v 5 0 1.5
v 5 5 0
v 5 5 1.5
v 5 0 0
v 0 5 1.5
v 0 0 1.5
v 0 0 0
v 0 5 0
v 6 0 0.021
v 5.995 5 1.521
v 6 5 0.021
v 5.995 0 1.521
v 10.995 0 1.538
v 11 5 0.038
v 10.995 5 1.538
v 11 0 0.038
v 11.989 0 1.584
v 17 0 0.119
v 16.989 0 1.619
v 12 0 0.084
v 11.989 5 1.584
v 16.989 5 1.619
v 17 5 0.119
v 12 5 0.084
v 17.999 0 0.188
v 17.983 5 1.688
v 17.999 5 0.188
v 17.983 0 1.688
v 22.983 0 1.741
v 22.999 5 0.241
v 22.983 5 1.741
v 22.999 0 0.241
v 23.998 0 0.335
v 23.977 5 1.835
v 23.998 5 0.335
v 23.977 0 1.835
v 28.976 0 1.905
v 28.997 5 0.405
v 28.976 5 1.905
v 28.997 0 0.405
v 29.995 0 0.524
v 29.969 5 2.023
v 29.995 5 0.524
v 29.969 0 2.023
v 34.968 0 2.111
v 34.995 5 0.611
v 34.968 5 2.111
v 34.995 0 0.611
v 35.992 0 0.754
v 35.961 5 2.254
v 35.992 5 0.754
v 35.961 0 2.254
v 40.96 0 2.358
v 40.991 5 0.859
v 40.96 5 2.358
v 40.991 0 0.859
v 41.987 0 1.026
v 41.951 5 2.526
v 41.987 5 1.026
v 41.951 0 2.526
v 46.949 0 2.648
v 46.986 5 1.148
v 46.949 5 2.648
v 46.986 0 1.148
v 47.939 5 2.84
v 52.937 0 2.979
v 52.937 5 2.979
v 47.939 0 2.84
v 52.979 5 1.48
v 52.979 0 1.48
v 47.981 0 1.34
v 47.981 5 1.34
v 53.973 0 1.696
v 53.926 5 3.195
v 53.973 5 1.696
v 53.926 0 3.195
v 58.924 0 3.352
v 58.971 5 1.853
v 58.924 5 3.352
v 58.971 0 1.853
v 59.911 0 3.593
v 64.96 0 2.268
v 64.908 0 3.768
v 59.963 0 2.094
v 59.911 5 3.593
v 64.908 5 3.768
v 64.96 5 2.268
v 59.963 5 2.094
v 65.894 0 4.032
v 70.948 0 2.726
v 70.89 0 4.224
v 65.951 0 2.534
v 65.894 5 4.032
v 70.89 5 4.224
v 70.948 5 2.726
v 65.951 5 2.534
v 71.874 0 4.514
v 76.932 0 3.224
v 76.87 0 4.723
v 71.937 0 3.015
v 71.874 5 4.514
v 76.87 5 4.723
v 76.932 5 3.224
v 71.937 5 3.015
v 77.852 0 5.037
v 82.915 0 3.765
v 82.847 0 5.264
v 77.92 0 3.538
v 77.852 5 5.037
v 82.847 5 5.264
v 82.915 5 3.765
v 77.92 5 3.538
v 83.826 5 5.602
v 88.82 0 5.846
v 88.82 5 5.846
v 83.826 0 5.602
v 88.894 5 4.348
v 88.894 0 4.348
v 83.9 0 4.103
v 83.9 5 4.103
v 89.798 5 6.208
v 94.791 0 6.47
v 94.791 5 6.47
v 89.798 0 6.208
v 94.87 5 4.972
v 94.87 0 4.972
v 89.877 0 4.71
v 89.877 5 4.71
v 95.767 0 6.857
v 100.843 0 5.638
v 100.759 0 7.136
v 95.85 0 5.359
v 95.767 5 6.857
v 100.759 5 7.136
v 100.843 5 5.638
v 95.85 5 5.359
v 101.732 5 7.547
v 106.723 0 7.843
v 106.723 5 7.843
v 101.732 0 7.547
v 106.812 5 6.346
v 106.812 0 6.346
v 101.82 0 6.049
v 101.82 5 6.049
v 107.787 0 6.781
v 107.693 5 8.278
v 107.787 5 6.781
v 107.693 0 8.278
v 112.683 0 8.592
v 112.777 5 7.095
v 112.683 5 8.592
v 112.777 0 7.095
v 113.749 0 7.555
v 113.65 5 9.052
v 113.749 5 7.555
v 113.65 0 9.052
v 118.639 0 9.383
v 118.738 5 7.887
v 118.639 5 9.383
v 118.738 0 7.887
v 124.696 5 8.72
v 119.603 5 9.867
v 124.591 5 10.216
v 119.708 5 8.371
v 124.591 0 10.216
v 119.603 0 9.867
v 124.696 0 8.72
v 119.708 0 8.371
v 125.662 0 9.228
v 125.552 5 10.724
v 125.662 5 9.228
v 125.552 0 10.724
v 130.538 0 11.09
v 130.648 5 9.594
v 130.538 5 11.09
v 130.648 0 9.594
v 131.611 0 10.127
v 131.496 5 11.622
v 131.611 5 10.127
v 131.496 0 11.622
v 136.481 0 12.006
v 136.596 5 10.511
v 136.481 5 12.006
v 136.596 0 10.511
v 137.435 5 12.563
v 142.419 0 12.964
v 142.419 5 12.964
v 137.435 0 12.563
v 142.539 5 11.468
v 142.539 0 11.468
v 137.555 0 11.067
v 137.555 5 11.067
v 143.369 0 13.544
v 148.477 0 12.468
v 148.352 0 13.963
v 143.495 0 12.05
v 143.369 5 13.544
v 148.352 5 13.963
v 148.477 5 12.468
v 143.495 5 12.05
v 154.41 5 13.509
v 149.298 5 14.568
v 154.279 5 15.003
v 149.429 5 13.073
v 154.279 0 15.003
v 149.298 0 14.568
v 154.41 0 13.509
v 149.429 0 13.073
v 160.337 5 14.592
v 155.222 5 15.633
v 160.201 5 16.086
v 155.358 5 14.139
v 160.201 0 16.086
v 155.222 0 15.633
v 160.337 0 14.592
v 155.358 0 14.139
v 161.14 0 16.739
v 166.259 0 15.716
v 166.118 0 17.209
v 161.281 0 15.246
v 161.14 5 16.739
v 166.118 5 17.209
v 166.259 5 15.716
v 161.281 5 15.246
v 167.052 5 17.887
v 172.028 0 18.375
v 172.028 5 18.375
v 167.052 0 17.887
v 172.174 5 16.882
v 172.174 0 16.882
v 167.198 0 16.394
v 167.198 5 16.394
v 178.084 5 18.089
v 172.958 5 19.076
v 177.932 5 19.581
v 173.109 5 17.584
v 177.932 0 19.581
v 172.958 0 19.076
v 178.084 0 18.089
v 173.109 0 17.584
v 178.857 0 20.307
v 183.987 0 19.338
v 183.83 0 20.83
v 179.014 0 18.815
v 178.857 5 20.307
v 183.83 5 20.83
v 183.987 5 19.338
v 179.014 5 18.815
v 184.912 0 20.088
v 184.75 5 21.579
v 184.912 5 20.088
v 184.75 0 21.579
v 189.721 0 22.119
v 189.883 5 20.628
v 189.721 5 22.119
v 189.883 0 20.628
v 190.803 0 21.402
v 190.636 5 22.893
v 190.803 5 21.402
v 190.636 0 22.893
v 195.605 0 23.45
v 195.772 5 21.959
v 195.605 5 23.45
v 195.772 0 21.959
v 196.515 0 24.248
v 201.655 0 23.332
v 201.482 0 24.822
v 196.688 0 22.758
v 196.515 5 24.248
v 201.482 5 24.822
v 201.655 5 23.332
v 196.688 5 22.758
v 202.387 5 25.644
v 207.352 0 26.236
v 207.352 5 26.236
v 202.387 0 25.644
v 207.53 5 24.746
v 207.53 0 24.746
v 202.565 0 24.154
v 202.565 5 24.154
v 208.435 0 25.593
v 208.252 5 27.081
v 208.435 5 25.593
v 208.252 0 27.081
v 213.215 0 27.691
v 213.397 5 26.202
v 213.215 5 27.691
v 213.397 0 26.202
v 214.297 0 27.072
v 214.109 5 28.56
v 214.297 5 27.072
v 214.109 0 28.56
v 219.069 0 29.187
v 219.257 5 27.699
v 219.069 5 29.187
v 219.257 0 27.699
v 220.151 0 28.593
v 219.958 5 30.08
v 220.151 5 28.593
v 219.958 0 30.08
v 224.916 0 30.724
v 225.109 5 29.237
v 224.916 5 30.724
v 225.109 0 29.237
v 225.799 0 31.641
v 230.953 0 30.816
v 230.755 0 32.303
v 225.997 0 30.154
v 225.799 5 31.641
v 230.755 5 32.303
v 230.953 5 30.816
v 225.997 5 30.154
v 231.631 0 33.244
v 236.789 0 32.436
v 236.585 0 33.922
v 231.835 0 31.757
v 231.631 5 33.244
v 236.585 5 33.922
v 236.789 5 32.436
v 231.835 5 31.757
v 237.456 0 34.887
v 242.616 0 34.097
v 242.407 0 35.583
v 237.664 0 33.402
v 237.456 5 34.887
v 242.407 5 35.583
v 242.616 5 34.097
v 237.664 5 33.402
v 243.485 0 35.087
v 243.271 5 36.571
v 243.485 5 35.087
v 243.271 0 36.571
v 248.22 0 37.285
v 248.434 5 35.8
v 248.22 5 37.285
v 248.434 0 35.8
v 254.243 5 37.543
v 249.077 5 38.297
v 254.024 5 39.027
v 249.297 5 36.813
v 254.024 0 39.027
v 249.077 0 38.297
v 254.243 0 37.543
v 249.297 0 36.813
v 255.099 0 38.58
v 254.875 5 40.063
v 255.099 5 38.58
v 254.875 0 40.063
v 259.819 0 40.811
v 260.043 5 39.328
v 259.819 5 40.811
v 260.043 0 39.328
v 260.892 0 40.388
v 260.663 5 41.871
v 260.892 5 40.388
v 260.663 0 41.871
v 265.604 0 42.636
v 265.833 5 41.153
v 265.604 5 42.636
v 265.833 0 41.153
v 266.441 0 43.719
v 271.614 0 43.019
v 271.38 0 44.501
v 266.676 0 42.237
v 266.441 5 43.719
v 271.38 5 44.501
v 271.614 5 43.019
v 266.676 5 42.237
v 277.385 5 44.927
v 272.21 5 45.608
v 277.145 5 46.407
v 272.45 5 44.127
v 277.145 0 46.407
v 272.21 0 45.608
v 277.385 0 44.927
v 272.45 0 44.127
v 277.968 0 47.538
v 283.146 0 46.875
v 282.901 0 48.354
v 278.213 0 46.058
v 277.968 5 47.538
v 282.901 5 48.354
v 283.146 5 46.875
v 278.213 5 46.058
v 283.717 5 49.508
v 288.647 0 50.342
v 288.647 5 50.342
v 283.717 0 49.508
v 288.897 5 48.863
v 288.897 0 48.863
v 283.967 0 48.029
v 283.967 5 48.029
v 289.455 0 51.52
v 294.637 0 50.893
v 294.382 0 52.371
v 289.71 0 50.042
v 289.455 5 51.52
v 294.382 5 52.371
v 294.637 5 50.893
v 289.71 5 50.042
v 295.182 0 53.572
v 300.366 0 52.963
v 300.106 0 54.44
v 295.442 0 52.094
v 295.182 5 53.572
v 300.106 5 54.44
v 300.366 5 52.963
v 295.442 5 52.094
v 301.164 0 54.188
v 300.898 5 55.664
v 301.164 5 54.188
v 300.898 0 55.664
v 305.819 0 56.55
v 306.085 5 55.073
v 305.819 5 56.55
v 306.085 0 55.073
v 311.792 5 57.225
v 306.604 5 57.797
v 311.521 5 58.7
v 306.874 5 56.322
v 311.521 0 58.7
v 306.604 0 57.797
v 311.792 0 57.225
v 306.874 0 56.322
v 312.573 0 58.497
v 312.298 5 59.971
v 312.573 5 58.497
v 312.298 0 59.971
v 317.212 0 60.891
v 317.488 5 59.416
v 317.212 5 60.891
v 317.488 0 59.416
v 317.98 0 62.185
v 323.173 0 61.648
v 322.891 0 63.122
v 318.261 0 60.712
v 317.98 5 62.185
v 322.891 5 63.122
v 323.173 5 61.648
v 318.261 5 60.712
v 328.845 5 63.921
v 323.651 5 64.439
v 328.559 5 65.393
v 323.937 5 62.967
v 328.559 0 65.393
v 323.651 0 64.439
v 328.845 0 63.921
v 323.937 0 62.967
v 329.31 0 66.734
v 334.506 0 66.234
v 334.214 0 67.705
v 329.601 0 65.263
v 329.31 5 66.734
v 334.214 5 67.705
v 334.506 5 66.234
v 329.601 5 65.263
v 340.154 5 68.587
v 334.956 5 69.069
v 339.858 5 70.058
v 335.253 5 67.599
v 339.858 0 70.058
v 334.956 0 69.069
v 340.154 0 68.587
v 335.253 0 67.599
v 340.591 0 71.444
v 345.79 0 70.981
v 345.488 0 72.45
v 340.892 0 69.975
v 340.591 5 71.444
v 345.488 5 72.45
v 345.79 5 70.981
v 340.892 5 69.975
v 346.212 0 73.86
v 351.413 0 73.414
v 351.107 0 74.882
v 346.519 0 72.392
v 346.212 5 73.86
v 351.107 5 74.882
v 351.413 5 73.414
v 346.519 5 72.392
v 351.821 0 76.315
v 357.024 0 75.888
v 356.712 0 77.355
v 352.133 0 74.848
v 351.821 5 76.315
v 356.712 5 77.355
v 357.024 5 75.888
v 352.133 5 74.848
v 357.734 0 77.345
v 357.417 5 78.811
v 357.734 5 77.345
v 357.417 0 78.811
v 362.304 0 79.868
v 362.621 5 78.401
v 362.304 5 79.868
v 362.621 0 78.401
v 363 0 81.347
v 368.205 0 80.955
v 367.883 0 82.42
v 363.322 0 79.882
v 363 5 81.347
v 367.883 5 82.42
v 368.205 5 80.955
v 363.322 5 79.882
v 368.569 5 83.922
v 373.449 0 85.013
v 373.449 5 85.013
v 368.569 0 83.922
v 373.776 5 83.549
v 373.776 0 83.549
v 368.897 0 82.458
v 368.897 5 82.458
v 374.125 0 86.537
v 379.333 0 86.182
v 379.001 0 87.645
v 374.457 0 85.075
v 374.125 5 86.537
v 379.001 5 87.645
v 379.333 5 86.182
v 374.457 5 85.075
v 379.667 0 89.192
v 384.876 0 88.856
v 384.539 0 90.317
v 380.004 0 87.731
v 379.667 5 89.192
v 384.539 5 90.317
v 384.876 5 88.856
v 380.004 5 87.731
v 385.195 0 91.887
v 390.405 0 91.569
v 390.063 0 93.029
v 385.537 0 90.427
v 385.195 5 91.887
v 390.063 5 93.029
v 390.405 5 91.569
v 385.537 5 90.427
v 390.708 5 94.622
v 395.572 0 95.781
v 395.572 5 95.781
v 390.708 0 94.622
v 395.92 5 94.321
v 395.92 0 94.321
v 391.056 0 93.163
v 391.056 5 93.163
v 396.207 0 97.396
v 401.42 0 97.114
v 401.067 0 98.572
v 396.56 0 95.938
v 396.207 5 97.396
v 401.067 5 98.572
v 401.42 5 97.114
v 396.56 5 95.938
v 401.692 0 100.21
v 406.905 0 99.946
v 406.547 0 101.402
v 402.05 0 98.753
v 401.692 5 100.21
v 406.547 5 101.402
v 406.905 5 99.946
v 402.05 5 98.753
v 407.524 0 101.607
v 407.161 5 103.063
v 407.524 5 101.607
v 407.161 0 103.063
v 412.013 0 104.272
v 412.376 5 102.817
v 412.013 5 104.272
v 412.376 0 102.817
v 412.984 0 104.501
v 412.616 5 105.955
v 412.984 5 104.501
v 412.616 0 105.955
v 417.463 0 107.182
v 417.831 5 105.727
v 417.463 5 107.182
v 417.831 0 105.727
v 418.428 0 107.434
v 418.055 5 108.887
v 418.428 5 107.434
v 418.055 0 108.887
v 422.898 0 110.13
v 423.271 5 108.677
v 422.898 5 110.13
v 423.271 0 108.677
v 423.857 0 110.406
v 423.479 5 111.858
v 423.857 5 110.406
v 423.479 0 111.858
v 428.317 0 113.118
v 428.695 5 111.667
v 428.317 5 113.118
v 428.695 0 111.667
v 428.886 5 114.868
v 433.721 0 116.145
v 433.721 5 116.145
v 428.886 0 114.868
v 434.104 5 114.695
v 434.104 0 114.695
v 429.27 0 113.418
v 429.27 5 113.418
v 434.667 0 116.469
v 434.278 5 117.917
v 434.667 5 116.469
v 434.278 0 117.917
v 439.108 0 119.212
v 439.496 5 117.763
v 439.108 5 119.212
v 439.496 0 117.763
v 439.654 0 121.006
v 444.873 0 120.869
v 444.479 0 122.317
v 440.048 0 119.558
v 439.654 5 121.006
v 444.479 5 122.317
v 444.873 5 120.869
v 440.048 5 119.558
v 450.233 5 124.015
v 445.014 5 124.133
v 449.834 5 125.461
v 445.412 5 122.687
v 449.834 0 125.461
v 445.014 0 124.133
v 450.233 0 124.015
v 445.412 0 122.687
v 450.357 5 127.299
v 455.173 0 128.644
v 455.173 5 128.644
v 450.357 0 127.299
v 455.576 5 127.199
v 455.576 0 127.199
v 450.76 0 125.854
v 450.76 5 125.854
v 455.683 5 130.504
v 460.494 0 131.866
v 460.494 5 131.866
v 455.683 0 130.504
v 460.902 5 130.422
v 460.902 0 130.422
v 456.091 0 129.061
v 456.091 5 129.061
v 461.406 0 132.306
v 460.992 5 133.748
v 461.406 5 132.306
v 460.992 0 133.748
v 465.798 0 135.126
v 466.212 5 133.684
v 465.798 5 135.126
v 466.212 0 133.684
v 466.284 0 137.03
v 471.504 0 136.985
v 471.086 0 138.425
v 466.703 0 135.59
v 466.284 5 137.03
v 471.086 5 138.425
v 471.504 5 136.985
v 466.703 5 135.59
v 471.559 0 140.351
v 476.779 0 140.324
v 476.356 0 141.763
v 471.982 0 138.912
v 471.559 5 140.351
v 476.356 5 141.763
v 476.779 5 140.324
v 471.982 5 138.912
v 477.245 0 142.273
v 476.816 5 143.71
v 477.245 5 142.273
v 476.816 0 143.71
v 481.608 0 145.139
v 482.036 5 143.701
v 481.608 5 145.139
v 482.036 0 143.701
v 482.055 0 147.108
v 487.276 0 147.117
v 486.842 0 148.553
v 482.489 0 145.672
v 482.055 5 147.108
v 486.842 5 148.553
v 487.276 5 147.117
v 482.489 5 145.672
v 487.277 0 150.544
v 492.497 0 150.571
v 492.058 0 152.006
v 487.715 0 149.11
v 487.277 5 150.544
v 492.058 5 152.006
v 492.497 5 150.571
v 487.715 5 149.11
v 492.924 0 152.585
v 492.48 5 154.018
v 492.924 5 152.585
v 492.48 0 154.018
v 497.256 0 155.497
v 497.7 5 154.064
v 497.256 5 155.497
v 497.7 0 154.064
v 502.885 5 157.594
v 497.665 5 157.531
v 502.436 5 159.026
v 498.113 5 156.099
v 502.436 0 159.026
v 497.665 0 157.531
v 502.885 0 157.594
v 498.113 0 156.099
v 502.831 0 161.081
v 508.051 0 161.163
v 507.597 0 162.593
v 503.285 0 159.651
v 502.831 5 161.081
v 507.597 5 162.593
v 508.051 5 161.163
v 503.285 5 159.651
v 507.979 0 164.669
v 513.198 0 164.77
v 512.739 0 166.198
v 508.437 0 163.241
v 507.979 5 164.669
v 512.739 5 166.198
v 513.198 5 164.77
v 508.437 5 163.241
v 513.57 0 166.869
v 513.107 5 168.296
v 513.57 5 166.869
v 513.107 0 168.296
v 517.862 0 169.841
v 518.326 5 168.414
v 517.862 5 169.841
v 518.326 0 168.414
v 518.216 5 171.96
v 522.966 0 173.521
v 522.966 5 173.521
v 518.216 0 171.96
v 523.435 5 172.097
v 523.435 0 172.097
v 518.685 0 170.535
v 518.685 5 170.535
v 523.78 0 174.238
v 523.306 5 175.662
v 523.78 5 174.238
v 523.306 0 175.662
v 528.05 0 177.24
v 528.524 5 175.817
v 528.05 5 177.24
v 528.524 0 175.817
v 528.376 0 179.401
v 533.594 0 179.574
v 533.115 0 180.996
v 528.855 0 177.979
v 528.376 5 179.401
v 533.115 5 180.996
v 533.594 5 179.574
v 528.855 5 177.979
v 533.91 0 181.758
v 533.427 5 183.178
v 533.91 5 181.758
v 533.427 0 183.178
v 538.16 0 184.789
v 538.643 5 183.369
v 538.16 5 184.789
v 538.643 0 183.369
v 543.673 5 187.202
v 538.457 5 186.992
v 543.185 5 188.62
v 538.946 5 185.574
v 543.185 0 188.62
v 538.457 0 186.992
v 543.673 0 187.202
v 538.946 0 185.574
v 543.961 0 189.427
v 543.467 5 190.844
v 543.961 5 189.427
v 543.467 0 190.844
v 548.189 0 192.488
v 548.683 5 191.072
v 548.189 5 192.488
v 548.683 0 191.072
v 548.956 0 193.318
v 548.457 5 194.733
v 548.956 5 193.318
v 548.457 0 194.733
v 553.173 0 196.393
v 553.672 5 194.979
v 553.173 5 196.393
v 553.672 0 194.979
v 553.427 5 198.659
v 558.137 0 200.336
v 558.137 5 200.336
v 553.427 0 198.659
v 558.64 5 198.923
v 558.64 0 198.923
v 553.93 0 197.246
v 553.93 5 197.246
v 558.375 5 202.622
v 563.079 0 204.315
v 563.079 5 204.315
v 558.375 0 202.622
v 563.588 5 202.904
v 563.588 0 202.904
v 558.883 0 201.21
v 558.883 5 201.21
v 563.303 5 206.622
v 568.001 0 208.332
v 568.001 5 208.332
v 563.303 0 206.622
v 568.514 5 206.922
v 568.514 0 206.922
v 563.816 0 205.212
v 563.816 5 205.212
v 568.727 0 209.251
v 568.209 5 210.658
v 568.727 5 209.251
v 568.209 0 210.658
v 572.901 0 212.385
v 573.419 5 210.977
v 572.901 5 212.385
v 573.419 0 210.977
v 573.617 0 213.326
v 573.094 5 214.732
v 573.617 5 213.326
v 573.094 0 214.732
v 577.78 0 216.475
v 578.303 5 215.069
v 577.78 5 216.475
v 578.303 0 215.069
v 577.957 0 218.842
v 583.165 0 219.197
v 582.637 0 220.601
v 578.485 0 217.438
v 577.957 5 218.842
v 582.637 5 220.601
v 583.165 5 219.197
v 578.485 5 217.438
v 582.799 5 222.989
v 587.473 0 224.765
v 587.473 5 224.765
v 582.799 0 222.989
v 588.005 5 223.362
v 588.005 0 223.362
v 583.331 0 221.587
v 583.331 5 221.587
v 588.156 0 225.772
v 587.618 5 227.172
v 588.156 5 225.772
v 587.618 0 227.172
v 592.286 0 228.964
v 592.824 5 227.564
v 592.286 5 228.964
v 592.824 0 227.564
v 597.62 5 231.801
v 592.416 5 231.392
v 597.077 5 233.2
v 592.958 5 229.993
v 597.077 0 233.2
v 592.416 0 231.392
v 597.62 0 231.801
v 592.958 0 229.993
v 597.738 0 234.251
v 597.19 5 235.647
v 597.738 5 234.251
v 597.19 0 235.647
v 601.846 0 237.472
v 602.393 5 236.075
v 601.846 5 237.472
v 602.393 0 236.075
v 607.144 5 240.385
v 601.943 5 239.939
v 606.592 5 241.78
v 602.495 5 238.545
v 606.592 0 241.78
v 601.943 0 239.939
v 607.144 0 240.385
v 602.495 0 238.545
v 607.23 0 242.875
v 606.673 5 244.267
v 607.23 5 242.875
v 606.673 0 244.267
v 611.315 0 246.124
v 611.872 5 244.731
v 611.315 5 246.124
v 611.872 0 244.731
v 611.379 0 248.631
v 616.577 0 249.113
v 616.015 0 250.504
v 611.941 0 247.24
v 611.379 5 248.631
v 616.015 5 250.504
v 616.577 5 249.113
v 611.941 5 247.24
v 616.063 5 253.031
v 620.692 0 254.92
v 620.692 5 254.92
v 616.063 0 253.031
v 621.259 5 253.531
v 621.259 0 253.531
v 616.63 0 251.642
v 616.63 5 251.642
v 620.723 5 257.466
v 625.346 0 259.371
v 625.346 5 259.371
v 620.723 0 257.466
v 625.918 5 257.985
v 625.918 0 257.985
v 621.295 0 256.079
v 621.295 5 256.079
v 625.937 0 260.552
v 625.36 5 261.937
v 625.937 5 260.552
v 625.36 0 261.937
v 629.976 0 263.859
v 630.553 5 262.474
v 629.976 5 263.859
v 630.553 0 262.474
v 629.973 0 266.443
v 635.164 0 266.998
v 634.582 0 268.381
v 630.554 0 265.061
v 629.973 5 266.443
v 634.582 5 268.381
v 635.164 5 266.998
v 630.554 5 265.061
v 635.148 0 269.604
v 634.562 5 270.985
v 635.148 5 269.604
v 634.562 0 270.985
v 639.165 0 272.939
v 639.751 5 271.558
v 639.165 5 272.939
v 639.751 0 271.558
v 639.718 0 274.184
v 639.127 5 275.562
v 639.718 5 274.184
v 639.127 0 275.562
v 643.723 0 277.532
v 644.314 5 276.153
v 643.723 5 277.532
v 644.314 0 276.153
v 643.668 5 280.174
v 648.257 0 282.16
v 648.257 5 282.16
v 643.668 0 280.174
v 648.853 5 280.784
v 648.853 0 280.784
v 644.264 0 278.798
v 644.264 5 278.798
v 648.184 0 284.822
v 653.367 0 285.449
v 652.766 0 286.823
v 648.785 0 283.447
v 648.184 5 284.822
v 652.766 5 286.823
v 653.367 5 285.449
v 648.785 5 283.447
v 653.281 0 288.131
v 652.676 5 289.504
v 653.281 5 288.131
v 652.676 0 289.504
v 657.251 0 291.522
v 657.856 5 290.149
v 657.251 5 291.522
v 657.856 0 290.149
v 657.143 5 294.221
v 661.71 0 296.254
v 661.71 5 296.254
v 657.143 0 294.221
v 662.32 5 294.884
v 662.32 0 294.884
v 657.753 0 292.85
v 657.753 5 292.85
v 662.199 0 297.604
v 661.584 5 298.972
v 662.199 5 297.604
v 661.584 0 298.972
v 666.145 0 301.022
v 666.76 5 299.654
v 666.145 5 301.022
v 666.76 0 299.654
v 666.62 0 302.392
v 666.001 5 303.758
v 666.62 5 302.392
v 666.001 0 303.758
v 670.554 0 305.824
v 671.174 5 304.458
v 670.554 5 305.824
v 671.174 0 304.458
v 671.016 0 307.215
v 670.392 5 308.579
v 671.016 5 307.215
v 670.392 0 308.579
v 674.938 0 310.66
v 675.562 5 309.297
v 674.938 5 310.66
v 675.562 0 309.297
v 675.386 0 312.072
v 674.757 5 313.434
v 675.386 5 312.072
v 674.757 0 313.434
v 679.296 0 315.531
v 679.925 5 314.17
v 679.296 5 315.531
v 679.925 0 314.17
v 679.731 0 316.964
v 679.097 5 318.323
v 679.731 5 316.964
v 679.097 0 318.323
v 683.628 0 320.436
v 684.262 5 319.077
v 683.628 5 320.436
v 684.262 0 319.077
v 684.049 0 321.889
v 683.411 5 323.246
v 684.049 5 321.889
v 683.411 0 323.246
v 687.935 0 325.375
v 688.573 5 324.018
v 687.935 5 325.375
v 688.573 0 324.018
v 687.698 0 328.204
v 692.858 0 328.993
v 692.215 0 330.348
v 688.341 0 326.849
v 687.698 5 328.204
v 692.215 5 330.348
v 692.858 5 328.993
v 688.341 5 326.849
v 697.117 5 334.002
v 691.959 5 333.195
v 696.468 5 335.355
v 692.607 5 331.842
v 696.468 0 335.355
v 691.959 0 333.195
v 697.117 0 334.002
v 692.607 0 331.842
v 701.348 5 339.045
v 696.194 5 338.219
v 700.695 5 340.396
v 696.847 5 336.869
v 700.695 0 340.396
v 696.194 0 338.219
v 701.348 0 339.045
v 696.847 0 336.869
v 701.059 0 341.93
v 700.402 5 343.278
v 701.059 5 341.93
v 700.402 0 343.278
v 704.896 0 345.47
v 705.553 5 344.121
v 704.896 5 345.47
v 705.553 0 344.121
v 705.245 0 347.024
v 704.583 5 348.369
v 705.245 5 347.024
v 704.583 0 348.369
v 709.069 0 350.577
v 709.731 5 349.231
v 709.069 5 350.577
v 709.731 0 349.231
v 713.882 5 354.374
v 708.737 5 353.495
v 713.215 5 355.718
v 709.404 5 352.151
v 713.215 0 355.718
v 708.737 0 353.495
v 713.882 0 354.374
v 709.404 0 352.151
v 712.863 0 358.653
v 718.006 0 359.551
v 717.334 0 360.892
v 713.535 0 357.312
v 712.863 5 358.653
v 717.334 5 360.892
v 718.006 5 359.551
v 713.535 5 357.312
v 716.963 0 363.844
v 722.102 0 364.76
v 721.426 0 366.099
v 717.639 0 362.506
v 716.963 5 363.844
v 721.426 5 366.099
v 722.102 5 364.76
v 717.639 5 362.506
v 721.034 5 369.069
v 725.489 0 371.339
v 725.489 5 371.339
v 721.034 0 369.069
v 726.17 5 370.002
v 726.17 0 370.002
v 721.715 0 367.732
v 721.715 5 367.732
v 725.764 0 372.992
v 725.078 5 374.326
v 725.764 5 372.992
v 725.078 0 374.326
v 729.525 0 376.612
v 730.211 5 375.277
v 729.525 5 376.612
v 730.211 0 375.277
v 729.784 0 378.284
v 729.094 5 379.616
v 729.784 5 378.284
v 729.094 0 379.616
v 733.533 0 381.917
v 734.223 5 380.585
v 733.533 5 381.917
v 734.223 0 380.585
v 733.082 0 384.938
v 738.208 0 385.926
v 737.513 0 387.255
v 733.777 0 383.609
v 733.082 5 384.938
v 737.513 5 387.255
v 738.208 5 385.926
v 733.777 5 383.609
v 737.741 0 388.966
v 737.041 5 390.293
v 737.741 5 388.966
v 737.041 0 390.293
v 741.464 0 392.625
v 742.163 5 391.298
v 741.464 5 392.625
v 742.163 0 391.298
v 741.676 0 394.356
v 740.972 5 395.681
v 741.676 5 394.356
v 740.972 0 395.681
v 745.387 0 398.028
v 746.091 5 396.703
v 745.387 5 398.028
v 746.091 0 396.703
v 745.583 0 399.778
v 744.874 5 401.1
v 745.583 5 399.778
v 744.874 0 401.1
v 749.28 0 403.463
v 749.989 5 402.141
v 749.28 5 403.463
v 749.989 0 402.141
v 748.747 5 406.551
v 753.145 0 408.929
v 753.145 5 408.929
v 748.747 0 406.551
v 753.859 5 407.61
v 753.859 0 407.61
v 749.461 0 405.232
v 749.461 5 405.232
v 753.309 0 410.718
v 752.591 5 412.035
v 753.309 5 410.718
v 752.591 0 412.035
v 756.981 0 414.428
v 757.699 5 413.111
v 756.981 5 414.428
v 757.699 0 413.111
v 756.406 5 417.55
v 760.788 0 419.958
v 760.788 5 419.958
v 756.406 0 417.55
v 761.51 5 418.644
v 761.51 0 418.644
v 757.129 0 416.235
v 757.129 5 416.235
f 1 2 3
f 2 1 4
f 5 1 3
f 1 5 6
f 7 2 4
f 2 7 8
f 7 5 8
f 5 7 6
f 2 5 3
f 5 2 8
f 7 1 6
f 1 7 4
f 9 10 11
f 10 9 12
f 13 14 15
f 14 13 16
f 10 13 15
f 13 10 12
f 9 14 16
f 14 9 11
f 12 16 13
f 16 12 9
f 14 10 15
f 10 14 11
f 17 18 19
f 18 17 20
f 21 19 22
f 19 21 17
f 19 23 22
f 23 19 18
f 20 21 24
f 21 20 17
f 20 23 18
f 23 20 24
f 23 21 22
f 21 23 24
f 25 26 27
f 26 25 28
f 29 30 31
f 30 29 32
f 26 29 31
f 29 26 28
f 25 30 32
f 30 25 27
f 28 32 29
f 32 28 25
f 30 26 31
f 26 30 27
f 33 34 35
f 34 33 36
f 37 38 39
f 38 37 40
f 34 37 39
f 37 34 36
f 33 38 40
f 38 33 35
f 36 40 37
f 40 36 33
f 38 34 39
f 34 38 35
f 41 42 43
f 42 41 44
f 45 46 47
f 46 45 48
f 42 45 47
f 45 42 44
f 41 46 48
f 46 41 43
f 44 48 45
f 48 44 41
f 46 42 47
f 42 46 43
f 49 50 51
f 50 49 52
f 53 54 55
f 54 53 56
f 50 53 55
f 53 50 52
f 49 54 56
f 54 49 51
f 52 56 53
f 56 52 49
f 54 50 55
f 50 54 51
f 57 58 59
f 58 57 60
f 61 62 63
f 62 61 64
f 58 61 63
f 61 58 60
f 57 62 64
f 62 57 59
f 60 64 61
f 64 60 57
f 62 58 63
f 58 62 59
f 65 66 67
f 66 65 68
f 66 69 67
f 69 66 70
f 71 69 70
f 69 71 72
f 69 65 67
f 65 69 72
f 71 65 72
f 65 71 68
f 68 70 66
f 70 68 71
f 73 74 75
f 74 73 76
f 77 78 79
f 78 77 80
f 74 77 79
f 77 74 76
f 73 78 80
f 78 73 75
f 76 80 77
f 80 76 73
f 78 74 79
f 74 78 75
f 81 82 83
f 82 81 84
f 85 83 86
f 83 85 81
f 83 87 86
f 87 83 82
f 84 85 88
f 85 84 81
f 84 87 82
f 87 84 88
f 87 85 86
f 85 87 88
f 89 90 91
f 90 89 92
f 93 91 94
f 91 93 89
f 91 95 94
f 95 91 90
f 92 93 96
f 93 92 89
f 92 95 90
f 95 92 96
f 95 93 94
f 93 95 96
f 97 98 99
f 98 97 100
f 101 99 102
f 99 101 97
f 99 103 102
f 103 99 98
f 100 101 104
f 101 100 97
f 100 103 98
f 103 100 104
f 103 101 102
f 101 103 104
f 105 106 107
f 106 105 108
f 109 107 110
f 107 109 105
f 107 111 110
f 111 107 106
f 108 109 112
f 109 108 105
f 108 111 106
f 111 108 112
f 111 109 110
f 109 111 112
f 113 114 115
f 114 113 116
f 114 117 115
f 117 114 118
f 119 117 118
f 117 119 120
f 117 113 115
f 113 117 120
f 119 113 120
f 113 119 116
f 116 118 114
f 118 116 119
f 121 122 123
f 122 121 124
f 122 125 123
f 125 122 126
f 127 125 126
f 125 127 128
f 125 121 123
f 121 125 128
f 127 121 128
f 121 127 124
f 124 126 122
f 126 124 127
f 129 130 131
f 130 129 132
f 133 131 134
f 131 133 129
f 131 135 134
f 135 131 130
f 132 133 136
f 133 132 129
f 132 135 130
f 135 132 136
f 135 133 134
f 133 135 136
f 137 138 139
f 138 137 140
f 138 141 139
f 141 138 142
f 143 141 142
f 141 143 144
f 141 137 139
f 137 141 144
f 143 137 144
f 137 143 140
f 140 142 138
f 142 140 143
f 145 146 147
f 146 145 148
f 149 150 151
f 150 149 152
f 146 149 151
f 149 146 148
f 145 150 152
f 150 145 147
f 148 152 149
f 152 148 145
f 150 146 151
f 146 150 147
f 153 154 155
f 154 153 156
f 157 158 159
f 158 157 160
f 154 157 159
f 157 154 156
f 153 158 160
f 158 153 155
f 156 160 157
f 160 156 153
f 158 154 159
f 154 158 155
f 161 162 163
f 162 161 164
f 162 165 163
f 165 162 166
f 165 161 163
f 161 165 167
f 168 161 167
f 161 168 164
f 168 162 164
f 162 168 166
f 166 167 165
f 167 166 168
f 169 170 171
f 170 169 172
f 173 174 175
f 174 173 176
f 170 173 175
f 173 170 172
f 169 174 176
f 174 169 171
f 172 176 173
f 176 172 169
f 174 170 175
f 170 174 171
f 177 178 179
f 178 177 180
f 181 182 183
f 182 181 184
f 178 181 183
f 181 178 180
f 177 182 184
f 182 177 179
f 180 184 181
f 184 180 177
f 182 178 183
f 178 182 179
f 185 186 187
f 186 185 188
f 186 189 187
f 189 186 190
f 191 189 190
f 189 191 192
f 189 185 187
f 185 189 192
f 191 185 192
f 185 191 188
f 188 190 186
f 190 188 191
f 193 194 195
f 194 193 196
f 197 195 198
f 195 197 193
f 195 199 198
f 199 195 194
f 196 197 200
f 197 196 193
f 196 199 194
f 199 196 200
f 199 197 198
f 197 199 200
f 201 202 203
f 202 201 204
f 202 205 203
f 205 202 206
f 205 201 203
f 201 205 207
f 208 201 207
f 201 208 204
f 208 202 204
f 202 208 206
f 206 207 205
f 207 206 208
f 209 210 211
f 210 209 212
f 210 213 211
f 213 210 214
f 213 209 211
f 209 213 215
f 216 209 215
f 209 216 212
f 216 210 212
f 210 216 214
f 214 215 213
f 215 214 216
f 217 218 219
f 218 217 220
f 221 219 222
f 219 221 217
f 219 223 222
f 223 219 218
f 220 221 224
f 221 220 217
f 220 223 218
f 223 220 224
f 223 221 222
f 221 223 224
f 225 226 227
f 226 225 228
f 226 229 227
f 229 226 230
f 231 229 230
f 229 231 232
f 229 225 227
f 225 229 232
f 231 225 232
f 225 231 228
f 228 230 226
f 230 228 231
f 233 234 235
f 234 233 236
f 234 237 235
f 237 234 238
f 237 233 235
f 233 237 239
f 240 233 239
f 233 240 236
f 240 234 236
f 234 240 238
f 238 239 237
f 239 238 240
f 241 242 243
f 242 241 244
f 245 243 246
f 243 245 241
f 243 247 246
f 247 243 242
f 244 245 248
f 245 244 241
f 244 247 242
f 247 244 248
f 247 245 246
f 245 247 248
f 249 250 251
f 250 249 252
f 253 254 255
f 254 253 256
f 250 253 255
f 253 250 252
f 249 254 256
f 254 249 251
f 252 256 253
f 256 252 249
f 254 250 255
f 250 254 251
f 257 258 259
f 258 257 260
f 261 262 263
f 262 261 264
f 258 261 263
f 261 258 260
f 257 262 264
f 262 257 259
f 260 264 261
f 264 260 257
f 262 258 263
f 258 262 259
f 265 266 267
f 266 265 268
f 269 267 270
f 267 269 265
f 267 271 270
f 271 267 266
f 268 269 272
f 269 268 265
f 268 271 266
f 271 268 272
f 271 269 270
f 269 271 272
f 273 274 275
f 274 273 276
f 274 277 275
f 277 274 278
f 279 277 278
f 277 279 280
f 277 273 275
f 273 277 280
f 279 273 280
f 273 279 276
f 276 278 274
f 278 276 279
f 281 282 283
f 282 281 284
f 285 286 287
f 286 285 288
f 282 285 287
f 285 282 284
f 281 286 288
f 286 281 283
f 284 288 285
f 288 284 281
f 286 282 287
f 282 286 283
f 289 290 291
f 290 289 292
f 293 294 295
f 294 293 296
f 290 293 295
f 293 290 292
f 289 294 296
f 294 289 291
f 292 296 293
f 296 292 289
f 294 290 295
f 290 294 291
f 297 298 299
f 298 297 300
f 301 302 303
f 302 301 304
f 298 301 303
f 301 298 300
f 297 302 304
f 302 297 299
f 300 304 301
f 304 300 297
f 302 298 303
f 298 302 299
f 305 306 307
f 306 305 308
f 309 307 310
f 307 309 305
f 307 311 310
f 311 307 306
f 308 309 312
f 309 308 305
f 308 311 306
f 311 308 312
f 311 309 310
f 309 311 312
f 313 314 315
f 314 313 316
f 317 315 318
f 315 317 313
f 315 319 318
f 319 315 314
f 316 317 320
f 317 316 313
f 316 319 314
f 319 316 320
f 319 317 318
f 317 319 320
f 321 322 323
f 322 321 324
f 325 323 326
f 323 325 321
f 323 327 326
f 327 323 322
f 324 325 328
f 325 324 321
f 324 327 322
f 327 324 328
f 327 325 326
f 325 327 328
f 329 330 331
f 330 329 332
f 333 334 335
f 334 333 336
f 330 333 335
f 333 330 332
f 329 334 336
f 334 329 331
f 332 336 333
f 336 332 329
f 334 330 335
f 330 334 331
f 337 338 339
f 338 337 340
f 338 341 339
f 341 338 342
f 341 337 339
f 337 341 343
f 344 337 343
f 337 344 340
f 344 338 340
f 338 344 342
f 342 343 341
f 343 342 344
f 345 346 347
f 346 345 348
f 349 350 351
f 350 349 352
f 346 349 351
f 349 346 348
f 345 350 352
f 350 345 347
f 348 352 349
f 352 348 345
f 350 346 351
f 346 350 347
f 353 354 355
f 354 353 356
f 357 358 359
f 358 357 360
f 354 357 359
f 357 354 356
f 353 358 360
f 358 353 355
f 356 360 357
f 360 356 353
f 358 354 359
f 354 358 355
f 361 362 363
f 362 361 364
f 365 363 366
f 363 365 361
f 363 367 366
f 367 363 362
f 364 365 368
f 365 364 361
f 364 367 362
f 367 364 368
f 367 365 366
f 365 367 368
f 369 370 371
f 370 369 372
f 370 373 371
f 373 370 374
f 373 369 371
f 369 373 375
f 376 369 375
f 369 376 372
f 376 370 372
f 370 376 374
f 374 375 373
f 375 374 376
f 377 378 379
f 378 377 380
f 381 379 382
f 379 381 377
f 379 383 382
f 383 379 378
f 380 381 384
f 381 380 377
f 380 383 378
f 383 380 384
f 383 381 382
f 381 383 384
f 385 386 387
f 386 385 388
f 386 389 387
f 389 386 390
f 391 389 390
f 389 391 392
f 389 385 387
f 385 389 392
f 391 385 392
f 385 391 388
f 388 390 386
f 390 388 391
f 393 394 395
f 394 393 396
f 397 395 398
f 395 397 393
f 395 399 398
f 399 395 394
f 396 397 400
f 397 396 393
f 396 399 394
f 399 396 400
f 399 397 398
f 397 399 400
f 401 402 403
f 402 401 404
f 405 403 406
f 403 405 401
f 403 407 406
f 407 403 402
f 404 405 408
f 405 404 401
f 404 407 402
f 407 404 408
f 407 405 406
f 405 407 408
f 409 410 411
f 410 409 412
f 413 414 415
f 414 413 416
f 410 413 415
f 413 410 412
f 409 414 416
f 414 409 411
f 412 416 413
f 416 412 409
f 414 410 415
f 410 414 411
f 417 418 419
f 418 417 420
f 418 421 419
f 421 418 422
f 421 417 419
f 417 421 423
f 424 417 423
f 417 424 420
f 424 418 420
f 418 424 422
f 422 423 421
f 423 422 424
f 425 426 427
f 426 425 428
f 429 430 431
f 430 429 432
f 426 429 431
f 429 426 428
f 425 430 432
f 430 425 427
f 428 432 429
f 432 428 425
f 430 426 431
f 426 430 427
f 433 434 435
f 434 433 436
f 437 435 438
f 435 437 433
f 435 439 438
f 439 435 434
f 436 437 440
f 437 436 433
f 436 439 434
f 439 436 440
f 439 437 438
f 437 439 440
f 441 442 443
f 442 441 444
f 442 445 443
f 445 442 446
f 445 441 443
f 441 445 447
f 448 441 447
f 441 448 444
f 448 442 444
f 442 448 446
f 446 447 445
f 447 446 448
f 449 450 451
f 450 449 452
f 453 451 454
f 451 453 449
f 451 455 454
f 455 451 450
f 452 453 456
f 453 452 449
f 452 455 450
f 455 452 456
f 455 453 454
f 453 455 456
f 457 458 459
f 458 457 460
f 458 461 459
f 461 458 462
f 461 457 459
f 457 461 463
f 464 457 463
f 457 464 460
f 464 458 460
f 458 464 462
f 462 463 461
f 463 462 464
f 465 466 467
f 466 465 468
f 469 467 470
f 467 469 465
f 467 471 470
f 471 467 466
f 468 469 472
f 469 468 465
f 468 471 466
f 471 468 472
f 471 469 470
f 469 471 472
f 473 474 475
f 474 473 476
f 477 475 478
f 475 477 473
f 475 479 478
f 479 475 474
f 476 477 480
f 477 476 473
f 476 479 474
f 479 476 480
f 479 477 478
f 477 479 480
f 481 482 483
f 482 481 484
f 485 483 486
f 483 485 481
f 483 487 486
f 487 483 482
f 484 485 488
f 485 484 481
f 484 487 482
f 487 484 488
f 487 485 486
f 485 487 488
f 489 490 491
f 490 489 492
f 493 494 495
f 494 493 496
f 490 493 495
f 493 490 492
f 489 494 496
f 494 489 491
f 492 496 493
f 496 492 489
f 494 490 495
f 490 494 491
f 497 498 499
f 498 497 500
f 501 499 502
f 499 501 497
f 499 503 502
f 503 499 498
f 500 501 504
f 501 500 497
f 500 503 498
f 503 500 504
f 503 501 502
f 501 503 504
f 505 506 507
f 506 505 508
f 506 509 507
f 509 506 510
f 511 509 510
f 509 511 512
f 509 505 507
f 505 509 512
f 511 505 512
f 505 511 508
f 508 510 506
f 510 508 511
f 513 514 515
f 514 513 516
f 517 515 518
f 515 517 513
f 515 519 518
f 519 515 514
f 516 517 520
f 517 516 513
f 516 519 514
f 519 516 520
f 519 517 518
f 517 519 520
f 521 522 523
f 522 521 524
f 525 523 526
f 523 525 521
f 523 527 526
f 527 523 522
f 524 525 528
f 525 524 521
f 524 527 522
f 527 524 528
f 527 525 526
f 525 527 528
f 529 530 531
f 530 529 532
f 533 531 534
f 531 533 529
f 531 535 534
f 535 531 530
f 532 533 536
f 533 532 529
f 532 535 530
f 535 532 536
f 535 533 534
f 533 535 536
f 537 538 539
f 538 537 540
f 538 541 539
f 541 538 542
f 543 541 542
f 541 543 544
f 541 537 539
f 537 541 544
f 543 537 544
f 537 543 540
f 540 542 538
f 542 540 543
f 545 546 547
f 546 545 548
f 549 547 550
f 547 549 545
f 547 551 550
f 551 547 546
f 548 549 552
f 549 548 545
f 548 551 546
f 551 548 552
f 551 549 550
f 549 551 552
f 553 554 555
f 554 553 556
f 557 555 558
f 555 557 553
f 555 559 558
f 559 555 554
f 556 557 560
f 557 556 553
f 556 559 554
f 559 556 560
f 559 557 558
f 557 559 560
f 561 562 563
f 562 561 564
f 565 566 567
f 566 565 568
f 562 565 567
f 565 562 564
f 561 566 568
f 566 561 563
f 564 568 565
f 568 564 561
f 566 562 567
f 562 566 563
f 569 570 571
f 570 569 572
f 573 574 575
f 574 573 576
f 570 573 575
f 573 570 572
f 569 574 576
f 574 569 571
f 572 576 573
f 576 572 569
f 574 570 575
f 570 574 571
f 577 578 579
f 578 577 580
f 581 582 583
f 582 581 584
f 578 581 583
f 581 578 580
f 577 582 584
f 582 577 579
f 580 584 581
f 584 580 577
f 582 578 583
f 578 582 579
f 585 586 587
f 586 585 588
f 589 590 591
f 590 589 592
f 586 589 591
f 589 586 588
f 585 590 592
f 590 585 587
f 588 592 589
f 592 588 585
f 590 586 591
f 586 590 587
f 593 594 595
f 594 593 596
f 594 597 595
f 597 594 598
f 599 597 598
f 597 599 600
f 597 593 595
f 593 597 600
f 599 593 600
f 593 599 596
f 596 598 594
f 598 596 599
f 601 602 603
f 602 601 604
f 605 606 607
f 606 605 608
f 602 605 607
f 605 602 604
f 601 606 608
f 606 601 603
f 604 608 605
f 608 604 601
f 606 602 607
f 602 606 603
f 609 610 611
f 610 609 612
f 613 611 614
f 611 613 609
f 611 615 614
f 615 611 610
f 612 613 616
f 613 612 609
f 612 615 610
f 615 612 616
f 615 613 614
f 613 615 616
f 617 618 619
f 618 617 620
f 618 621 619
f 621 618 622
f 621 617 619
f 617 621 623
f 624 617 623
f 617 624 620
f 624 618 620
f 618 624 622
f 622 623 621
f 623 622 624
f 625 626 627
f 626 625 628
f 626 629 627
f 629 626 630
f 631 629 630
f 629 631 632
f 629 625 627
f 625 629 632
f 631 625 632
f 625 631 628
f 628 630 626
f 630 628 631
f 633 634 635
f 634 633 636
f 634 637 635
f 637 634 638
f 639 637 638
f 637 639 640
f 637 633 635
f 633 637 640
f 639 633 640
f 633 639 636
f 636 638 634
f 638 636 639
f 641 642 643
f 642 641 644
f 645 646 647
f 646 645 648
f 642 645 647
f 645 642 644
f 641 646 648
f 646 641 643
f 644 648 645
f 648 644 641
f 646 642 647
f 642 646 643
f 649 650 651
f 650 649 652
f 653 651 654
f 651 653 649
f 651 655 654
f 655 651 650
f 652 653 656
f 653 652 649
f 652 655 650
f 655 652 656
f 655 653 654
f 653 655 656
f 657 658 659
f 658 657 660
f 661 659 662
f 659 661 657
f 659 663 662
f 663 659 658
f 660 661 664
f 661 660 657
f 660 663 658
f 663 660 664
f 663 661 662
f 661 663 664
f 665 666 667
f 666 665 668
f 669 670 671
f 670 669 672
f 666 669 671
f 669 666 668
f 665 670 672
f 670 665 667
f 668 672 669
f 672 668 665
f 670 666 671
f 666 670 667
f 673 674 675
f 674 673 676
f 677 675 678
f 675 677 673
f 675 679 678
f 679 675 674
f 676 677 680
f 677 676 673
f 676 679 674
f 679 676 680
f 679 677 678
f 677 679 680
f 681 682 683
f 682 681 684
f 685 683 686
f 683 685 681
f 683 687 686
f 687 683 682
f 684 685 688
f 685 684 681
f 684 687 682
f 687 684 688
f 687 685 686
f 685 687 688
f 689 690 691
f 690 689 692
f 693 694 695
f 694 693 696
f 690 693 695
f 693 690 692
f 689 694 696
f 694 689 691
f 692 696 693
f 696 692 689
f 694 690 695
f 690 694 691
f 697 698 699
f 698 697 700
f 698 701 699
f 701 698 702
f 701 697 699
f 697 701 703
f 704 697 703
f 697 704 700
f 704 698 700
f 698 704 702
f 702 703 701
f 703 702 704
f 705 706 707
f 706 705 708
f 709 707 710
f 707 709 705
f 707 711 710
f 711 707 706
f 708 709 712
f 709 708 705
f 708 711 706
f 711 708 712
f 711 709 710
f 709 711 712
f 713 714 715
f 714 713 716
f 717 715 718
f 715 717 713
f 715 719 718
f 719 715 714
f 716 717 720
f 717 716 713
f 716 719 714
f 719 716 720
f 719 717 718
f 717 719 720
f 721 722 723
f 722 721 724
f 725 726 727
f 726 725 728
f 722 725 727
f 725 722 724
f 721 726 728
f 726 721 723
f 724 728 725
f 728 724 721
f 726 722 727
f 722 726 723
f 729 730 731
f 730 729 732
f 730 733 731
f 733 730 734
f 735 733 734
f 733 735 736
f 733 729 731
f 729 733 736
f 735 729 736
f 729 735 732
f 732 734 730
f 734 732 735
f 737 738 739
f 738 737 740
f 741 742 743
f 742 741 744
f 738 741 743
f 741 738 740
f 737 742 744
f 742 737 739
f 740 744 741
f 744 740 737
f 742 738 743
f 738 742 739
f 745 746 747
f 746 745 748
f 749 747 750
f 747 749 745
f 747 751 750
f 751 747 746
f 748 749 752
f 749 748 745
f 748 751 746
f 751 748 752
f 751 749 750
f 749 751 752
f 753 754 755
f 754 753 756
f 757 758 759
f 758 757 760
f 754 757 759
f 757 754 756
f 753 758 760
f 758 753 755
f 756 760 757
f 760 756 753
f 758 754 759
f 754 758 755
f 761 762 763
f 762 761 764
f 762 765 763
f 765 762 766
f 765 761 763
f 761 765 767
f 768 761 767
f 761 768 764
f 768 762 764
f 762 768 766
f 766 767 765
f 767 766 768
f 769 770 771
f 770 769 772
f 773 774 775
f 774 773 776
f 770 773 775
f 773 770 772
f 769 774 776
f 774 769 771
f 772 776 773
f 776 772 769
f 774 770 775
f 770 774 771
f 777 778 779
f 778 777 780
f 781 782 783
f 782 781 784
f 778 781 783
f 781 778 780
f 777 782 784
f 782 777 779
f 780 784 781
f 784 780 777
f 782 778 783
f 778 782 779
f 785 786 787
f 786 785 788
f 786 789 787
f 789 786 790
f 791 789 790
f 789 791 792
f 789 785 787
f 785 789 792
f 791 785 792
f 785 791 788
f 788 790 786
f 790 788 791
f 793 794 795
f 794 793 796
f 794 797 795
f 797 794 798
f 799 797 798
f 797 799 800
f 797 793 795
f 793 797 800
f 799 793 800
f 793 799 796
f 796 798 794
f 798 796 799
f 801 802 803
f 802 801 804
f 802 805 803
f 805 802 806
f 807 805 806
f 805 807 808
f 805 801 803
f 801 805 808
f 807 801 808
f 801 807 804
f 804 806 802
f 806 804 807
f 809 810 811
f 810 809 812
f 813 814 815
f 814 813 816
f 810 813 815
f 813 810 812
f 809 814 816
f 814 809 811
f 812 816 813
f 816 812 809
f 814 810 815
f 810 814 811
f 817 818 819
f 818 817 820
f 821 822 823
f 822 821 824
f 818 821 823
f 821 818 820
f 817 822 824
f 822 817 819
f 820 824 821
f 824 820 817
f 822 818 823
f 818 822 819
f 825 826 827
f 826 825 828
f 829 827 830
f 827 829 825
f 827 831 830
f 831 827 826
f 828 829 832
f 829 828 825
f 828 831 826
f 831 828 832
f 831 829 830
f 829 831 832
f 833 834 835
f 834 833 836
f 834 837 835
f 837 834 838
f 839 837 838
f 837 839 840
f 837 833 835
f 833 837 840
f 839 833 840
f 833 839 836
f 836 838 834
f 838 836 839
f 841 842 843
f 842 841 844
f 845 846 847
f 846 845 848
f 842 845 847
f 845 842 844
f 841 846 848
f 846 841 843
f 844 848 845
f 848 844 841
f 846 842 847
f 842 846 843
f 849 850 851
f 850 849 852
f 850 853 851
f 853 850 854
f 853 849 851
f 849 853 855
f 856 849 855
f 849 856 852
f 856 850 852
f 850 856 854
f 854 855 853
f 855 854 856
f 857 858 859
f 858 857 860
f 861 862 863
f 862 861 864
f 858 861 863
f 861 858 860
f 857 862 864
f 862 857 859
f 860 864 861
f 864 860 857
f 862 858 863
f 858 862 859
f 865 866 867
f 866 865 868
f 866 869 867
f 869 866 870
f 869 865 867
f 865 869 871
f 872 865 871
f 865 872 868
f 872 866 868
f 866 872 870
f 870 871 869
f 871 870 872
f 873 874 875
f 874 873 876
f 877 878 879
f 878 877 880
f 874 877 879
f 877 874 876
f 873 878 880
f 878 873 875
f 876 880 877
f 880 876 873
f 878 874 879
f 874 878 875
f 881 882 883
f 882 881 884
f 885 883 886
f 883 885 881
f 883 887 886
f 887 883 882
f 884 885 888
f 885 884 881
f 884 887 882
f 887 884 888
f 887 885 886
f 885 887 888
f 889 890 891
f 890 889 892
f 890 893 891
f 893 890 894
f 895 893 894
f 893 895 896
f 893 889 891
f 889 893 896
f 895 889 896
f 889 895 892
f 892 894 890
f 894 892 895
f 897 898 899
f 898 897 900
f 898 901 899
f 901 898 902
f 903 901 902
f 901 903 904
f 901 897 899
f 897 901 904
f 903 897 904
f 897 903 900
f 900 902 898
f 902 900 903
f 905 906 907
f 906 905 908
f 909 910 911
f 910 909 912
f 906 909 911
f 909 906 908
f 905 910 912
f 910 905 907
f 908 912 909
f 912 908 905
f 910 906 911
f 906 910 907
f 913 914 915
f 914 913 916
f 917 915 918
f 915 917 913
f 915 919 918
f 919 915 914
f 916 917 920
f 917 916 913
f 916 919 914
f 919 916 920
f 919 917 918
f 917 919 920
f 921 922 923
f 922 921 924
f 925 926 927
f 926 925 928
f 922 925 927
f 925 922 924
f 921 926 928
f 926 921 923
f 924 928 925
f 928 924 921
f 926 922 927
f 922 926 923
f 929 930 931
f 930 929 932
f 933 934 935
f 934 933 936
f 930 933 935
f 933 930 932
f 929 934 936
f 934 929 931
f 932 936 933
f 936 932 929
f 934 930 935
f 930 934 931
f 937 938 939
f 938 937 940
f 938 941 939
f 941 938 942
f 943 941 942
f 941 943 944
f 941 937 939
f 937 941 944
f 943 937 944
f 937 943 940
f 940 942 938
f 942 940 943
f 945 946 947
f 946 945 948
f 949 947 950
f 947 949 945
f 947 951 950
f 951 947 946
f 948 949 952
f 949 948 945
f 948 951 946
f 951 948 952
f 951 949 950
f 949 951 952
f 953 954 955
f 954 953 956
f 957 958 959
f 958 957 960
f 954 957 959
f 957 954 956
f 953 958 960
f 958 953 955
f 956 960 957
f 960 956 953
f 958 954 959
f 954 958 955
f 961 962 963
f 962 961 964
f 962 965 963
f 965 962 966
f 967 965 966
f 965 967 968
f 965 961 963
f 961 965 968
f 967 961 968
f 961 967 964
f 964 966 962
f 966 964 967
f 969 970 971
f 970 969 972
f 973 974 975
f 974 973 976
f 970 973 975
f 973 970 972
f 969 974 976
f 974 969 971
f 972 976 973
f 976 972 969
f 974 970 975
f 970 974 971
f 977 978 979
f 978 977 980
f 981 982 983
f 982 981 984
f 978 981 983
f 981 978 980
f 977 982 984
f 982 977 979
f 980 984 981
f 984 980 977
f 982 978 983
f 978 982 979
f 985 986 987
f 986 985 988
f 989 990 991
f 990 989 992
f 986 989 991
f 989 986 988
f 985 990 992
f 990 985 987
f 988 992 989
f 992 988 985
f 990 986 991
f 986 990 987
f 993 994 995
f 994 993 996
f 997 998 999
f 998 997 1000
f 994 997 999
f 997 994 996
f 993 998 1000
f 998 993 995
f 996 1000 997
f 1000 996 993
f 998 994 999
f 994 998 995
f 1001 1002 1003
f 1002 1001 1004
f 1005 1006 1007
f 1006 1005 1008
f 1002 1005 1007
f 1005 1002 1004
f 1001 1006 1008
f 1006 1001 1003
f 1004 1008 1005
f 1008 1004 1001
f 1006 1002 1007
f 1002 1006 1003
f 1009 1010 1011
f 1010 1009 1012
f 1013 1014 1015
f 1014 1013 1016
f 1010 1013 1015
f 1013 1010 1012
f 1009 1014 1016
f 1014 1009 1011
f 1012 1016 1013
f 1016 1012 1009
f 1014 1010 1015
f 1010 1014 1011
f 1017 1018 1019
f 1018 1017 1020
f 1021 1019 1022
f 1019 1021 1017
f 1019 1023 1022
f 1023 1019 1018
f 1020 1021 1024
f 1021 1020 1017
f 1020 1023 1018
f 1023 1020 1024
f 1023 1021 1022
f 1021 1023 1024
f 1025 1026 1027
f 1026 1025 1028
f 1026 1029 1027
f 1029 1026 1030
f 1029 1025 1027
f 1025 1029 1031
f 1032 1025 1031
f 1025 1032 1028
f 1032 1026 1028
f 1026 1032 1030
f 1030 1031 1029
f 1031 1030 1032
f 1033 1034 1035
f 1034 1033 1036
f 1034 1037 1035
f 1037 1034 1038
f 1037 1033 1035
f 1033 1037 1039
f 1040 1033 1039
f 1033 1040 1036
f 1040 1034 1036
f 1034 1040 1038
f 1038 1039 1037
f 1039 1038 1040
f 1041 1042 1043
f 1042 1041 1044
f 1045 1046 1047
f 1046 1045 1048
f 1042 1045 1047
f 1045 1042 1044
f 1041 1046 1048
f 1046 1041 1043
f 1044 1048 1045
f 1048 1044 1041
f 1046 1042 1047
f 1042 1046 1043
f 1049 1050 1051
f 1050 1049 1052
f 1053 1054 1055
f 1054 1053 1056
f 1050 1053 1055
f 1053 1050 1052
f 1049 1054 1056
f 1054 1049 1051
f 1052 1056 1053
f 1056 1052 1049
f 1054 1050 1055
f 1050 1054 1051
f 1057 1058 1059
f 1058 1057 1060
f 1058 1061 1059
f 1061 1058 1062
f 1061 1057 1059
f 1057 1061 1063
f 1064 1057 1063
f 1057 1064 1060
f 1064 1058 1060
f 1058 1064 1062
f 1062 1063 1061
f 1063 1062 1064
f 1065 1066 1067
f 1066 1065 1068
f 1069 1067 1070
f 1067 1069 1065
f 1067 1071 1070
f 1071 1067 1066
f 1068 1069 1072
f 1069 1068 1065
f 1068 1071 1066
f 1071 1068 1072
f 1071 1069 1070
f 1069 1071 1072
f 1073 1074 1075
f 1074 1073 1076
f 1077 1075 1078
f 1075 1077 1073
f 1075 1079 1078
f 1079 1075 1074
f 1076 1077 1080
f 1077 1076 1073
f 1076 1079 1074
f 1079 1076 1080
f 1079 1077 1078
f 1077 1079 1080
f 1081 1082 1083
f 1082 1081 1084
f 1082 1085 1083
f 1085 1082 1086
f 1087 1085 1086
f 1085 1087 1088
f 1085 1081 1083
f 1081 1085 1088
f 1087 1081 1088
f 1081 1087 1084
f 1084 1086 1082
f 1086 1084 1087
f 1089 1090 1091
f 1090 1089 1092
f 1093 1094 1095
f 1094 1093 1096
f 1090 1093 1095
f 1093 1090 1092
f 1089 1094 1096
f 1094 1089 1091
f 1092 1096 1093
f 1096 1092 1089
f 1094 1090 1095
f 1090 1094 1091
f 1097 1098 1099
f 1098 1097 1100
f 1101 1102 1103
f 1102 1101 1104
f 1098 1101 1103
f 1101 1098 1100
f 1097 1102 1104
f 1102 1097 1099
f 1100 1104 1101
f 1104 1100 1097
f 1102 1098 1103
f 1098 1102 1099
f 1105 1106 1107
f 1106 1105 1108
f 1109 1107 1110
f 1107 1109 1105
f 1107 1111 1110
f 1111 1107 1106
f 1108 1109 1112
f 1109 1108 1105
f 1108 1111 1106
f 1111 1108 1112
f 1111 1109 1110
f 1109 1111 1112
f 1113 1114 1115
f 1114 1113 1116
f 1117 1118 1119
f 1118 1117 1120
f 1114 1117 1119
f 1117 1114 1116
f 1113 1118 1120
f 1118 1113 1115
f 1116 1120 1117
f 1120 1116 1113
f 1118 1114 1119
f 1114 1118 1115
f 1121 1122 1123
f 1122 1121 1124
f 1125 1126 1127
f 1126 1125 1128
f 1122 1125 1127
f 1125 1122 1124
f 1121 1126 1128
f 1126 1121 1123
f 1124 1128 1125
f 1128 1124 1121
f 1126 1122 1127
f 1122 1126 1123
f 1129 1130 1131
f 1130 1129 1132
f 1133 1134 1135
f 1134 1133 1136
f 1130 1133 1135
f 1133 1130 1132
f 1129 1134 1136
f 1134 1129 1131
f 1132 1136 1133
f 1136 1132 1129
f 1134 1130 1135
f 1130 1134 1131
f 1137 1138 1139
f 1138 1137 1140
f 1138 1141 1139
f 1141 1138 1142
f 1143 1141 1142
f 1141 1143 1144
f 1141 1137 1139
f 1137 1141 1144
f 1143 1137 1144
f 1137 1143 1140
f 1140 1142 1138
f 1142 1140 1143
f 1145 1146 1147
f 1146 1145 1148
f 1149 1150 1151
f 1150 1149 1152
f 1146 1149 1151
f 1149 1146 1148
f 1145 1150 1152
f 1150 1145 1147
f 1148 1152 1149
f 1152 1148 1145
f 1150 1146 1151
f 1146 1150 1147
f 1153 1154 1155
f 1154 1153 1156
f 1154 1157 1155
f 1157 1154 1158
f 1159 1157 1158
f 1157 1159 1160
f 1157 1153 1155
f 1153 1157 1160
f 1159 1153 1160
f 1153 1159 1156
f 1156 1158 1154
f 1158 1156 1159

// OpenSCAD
diameter=100;
strip_width=12;

$fn=100;


smidge=0.05;

/*
difference() {
  cylinder(r1=diameter/2, r2=diameter/2+4, h=strip_width);
  translate([0, 0, -smidge])
    cylinder(r1=diameter/2 -1, r2=diameter/2+3, h=strip_width+smidge*2);
}
*/


for (x = [0 : 1 : 144]) {
  rotate([0, -0.2 * x, 0])
  translate([x * 6, 0, 0])
    pixel();
}

module pixel() {
  h=1.5;
  w=5;
  cube([w,w,h]);
  /*translate([w/2,w/2,h])
    light_cone(100);
    */
}

module light_cone(h=10) {
  angle=160;
  bottom=3;
  color("red", alpha=0.1)
  cylinder(r1=bottom/2, r2=(bottom+tan(angle/2) * h * 2)/2, h=h);

}
